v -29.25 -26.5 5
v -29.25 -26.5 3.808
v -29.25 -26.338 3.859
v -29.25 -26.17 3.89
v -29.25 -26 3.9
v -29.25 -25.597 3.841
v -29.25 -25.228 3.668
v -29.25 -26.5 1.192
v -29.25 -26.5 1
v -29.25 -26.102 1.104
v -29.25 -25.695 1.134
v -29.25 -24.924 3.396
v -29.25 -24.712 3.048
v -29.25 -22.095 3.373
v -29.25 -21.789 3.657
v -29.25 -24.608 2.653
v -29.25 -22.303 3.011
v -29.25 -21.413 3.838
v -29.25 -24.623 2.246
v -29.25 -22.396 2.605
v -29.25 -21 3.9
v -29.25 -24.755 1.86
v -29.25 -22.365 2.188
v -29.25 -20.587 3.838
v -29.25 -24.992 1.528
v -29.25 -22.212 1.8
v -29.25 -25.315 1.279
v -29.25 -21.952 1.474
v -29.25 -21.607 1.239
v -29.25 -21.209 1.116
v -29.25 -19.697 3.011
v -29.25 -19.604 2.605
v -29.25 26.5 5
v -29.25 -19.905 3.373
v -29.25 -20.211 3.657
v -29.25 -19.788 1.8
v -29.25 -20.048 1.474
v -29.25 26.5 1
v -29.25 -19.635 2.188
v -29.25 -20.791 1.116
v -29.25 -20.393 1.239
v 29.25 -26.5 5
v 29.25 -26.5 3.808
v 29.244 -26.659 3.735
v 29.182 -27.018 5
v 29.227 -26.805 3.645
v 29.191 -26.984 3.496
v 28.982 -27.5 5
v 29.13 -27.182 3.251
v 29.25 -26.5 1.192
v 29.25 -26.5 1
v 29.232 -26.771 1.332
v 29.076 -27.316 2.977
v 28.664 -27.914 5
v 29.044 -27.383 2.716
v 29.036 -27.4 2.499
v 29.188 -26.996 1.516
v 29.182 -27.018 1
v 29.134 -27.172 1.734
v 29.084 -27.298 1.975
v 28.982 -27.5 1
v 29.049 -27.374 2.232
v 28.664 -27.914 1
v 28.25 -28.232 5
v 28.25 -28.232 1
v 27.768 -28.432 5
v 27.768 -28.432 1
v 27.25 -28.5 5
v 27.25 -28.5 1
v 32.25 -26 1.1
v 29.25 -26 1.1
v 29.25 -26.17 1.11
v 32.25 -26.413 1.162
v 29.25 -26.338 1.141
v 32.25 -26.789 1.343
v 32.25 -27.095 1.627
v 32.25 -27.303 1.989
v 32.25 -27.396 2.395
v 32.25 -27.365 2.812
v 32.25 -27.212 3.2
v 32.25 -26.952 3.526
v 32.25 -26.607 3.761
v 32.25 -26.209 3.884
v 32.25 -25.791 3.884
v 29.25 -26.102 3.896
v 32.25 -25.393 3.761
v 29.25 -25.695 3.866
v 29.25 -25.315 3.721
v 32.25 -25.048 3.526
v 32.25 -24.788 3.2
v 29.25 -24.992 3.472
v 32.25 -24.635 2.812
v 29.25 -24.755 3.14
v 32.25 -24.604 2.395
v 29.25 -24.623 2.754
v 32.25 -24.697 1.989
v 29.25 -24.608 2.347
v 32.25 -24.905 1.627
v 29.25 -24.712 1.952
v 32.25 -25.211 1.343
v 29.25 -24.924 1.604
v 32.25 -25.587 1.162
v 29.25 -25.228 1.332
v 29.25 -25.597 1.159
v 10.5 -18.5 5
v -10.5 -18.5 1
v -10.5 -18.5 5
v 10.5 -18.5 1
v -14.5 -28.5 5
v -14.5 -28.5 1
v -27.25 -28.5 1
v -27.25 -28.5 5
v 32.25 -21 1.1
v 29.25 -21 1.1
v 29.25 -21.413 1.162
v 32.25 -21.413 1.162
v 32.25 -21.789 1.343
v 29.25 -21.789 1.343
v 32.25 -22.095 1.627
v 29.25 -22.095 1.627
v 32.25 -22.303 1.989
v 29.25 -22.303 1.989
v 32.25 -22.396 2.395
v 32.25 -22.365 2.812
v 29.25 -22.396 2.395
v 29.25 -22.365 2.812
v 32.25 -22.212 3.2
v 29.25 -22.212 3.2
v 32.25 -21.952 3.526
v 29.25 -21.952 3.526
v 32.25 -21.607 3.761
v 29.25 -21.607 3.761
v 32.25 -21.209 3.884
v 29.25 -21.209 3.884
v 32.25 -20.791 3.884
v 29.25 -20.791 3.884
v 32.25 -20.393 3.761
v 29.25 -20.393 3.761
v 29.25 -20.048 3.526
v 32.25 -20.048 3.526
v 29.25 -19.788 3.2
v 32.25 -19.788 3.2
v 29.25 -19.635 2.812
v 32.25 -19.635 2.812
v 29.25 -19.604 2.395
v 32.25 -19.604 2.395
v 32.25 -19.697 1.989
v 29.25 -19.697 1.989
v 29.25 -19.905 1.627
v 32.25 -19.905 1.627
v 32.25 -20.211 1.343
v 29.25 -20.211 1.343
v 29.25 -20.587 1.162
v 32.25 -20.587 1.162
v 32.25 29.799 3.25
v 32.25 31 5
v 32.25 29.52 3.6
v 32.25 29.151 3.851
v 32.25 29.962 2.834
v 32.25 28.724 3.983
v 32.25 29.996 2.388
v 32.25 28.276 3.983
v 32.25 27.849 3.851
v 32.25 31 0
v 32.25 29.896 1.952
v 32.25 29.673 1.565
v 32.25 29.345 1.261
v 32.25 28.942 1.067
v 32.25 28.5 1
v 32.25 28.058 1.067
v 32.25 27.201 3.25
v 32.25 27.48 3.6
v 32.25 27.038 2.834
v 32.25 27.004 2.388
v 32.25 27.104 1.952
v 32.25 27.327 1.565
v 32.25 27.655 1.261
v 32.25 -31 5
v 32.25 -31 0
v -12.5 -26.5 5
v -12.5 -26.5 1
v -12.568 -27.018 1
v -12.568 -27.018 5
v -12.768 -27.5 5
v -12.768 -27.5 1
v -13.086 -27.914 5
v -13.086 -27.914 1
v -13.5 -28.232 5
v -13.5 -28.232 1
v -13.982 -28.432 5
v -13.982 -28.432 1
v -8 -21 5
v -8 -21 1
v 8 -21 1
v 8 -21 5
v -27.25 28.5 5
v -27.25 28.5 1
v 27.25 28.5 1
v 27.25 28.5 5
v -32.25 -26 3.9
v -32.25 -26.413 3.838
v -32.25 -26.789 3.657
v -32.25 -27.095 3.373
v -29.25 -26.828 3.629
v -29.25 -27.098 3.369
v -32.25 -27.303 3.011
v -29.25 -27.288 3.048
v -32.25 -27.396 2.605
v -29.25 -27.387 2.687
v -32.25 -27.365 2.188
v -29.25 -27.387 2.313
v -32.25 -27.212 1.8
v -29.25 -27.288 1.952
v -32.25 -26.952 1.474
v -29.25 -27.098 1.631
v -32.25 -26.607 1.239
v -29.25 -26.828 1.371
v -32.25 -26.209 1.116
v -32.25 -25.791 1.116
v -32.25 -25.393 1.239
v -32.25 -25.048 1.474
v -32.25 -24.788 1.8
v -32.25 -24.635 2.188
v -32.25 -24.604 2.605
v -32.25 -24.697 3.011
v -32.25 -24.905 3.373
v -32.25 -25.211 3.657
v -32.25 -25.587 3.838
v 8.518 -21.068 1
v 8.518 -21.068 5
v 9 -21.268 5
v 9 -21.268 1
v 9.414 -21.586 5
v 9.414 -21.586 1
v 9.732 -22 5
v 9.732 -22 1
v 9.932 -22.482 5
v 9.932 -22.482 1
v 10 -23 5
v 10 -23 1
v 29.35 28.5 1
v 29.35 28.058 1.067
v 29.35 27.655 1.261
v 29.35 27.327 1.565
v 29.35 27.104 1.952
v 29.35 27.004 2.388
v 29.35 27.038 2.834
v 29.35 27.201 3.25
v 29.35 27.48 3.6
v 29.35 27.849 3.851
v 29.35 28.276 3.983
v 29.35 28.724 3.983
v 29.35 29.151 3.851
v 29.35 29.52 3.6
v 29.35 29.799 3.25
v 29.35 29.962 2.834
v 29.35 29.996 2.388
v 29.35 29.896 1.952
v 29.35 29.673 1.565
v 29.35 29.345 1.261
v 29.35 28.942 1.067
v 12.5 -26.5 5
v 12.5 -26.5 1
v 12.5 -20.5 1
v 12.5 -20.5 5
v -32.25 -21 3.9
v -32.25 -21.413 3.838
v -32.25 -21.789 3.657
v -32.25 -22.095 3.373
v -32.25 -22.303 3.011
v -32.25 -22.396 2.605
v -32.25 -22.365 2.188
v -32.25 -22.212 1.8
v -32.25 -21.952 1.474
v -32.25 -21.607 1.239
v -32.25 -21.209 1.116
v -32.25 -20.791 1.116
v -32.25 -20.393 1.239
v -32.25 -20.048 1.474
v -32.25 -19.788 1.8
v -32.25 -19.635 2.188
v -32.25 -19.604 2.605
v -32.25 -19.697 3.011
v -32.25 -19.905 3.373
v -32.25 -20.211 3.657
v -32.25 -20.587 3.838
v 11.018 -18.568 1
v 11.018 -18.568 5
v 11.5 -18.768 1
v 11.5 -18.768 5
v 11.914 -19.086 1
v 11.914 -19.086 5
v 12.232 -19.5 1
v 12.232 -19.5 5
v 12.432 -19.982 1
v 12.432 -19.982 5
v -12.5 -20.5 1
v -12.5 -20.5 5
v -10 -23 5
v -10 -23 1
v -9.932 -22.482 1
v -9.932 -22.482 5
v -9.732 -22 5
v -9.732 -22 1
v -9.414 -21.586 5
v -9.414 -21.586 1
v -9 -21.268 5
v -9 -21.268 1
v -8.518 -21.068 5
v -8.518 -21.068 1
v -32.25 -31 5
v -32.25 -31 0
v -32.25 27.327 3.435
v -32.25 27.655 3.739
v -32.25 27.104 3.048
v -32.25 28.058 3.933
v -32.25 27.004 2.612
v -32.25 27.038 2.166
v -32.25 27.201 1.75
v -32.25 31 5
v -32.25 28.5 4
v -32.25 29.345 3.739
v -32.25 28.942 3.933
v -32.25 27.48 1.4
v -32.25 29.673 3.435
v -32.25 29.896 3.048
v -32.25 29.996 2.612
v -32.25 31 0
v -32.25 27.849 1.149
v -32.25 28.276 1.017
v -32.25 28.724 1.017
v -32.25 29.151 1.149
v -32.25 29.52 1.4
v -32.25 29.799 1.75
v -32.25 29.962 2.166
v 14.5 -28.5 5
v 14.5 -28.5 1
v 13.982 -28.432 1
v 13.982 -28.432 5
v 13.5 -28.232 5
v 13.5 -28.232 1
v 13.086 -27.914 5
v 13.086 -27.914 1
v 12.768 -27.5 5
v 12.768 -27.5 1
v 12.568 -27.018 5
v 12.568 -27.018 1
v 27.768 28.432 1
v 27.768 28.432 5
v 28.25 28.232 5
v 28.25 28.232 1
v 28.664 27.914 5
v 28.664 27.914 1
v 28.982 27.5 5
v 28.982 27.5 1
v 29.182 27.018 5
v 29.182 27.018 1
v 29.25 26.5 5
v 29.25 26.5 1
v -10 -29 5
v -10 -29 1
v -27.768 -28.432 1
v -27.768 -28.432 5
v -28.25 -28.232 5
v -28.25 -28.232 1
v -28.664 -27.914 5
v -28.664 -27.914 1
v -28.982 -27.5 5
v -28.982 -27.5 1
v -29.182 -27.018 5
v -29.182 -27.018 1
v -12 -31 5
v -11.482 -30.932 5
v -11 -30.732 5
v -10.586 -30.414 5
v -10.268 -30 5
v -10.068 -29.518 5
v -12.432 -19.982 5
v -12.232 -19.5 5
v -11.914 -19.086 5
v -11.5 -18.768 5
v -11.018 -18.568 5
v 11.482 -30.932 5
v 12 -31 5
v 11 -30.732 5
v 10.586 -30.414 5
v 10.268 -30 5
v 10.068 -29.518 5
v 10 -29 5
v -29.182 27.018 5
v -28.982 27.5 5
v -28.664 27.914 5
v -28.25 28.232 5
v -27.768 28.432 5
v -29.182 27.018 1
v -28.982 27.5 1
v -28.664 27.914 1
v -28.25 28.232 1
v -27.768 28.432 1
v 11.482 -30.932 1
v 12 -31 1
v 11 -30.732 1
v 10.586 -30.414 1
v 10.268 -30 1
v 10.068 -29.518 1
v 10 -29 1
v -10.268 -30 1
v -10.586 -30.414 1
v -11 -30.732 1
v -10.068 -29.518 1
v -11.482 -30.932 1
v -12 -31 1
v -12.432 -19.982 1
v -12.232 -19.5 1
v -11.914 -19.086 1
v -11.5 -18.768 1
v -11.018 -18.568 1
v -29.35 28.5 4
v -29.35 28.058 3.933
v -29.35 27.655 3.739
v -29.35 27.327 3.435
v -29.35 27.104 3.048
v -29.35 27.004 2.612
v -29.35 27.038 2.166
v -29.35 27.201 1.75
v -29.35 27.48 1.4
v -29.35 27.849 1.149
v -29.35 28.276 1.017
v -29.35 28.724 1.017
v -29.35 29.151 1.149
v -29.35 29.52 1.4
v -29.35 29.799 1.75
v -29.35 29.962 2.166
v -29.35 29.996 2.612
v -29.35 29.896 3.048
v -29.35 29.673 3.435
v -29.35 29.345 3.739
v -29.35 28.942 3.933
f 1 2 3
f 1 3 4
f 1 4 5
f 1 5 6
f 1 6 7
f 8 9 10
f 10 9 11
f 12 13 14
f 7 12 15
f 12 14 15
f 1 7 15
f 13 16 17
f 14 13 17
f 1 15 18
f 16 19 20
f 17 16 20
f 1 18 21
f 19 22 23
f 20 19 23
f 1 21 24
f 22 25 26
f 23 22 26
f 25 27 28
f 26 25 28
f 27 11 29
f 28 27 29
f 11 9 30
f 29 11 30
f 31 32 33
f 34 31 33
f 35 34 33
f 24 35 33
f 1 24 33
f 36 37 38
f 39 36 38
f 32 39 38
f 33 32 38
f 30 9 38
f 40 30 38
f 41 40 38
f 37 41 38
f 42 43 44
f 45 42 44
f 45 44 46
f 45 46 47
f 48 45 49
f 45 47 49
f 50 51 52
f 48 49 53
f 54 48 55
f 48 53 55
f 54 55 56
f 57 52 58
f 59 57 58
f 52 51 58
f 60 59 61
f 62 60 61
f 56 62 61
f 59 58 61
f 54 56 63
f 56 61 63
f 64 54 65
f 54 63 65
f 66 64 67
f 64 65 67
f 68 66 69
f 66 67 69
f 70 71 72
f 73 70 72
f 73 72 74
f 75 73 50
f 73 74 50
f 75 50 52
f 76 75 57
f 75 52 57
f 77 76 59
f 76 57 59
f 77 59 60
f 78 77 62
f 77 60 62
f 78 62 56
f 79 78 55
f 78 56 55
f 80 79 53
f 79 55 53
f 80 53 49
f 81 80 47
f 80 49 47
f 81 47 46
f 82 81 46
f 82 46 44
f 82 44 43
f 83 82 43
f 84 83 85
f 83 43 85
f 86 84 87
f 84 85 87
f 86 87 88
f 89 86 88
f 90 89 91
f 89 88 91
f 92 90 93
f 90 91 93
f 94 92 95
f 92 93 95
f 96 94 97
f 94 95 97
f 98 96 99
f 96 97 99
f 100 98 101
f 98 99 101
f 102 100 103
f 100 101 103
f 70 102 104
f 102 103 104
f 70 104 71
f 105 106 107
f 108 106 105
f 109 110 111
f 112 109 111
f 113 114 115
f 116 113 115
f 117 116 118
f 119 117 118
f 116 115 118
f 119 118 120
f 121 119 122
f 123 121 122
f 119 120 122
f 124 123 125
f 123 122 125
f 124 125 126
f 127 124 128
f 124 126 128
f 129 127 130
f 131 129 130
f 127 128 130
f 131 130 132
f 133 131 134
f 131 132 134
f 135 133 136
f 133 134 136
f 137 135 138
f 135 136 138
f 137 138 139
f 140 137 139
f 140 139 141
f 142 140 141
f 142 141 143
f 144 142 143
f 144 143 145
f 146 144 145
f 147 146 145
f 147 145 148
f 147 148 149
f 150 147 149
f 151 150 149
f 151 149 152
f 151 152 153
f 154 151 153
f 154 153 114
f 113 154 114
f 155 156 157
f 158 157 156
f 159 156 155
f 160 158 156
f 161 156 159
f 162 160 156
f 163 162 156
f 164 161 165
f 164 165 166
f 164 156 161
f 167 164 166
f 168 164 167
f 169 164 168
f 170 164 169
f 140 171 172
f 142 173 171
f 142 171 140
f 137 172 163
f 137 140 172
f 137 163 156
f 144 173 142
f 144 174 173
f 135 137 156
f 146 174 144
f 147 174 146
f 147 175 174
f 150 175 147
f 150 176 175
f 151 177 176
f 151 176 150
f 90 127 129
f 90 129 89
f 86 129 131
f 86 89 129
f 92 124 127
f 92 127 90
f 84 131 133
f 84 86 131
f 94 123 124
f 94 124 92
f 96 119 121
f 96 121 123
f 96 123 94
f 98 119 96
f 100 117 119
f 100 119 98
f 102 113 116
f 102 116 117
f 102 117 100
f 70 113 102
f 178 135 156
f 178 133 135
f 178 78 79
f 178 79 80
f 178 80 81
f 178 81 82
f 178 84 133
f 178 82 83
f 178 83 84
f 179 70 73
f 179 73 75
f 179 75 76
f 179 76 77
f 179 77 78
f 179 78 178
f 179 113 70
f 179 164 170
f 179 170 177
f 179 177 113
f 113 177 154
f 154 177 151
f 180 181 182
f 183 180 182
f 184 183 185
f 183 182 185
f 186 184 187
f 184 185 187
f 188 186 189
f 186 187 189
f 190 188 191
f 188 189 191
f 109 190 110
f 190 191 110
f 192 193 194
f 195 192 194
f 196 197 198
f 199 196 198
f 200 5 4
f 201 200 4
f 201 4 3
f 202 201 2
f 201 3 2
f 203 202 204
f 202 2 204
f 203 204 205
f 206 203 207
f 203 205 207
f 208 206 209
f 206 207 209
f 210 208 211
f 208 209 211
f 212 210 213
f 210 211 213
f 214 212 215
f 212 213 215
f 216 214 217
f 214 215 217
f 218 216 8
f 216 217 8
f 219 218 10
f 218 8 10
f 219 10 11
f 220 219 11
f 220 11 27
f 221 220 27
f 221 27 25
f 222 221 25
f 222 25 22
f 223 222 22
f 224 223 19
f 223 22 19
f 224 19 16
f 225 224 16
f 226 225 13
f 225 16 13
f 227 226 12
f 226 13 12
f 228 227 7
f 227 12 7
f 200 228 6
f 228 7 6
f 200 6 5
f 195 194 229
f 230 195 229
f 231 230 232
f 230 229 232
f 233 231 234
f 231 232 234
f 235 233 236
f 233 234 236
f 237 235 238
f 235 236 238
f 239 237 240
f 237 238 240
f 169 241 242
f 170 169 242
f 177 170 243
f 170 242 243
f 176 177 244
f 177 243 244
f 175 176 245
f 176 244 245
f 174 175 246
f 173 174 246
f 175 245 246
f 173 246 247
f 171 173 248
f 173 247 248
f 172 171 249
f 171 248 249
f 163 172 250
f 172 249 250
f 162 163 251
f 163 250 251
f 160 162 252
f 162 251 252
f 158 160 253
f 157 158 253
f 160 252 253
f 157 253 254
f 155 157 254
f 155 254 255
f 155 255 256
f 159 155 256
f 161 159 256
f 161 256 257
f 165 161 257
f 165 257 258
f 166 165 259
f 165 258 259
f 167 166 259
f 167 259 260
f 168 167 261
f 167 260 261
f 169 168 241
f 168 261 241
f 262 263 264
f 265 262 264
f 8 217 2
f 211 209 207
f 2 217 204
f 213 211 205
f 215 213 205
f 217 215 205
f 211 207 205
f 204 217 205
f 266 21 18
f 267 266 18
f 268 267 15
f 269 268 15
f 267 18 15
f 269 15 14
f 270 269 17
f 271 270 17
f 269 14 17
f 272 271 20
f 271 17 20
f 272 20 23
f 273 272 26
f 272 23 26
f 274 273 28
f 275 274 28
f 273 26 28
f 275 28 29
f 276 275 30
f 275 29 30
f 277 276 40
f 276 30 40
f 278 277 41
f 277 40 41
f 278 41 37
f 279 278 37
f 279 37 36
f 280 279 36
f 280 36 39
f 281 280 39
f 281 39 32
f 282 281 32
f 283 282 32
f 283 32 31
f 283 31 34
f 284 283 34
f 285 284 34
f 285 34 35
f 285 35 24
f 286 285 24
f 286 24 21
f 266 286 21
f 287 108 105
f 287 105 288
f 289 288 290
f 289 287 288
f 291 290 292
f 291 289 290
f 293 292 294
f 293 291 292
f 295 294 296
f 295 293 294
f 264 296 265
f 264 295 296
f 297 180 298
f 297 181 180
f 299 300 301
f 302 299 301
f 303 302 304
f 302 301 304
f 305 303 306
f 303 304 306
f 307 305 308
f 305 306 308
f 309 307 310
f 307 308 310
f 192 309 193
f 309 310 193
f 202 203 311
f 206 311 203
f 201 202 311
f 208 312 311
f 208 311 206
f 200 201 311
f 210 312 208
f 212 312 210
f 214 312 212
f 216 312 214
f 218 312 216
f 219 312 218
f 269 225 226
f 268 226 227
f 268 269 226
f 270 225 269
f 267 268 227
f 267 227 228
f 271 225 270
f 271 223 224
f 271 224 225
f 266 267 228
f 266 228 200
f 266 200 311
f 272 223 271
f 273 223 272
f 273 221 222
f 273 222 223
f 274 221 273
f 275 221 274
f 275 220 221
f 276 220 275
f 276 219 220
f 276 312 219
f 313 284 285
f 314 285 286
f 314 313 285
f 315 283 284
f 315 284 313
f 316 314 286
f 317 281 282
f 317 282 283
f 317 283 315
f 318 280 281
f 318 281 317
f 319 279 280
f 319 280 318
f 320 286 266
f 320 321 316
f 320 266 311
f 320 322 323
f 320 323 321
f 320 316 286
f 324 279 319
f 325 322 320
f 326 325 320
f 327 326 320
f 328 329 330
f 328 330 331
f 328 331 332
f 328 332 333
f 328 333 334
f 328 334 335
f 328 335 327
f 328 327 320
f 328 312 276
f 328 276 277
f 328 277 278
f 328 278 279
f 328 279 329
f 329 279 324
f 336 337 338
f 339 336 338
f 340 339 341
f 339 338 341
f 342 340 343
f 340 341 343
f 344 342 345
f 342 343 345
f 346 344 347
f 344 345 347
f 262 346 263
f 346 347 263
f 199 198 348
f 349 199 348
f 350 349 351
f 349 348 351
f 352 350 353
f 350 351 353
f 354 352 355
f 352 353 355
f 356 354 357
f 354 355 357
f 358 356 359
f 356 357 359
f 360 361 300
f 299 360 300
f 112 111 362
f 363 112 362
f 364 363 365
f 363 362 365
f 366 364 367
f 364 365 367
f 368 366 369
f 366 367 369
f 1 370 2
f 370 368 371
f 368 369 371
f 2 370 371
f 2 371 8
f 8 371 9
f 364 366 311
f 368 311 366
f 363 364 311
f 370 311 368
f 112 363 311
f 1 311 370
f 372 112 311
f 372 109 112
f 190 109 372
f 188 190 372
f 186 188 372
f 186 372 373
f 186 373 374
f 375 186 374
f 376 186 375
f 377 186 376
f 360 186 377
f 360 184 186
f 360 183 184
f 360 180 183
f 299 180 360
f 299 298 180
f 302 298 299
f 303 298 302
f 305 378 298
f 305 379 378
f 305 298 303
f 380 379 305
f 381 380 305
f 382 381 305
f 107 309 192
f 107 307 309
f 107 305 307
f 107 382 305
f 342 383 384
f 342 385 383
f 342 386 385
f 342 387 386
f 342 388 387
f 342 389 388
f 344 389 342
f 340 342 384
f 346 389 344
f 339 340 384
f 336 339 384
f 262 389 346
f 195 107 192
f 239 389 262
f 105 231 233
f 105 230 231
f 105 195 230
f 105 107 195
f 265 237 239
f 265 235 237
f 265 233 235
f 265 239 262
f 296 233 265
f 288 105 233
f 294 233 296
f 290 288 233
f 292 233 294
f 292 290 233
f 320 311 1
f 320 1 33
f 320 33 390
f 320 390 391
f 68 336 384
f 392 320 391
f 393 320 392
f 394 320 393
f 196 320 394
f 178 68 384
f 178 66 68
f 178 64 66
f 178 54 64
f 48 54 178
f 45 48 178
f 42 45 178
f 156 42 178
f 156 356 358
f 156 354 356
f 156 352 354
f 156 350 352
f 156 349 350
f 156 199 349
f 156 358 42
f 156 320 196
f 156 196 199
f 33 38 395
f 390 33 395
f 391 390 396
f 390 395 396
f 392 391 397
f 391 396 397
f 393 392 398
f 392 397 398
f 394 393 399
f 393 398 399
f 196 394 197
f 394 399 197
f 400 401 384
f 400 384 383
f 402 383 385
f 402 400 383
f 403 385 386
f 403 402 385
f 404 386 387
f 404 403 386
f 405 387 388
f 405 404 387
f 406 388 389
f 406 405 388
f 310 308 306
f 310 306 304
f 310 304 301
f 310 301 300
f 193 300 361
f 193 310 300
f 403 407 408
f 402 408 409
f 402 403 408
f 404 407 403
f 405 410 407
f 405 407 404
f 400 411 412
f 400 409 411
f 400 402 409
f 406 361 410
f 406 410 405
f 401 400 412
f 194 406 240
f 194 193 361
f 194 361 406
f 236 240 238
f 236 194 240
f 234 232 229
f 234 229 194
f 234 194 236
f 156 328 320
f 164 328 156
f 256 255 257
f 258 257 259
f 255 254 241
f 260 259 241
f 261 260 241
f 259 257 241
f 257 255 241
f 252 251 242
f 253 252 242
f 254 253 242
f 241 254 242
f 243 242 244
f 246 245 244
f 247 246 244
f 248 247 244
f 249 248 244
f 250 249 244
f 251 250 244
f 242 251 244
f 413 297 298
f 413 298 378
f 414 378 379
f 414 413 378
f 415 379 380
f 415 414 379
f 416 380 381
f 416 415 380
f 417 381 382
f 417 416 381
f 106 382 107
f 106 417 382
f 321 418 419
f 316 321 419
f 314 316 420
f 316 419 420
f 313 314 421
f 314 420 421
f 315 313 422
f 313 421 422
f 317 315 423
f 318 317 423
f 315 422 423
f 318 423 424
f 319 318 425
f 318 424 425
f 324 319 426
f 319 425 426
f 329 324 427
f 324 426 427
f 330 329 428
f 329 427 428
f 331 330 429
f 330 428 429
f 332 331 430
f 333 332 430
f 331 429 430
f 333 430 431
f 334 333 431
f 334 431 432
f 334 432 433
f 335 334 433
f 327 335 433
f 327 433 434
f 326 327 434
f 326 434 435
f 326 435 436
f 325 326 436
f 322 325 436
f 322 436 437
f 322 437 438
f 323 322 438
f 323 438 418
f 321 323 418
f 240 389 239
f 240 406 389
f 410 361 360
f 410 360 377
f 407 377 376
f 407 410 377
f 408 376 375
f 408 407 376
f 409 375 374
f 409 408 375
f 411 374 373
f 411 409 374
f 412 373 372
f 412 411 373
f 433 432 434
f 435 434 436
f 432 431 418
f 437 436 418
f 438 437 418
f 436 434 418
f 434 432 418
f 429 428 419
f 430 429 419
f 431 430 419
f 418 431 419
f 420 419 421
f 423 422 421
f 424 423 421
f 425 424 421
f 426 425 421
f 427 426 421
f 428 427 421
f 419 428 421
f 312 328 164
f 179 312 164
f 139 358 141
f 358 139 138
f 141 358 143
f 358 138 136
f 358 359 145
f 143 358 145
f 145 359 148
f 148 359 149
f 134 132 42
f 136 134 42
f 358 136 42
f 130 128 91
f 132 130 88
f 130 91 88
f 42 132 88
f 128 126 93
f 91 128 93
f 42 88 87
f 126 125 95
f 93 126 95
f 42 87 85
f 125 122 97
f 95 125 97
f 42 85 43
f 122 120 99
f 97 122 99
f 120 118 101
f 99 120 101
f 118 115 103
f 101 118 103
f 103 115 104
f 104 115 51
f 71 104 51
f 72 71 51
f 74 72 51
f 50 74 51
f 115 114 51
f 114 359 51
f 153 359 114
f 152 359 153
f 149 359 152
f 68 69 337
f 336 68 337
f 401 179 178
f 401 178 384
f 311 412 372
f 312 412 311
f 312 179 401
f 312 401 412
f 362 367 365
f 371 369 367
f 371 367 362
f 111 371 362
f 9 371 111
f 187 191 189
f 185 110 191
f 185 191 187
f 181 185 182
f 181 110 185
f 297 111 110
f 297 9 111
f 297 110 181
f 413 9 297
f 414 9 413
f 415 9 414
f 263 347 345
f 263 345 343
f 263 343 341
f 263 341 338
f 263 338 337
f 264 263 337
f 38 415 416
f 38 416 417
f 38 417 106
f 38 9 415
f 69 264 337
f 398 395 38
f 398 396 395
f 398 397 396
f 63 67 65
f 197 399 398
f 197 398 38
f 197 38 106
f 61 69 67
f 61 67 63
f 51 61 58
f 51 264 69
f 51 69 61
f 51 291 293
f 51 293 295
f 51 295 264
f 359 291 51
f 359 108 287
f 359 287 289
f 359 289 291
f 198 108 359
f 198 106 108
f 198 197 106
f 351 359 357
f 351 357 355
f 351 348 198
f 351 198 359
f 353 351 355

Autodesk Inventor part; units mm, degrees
ref_plane "YZ Plane" through (0, 0, 0) normal (1, 0, 0) x (0, 1, 0)
ref_plane "XZ Plane" through (0, 0, 0) normal (0, 1, 0) x (-1, 0, 0)
ref_plane "XY Plane" through (0, 0, 0) normal (0, 0, 1) x (1, 0, 0)
sketch "スケッチ1" plane through (0, 0, 0) normal (0, 0, 1) x (1, 0, 0)
  line L0 (-32.25, 31) -> (32.25, 31)
  line L1 (32.25, 31) -> (32.25, -31)
  line L2 (32.25, -31) -> (10, -31)
  line L3 (-32.25, -31) -> (-32.25, 31)
  line L4 (-32.25, 31) -> (32.25, -31) construction
  line L5 (32.25, 31) -> (-32.25, -31) construction
  line L6 (-29.25, 28.5) -> (29.25, 28.5)
  line L7 (29.25, 28.5) -> (29.25, -28.5)
  line L8 (29.25, -28.5) -> (12.5, -28.5)
  line L9 (-29.25, -28.5) -> (-29.25, 28.5)
  line L10 (-29.25, 28.5) -> (29.25, -28.5) construction
  line L11 (29.25, 28.5) -> (-29.25, -28.5) construction
  line L12 (0, 31) -> (0, -28.25) construction
  line L13 (-10, -31) -> (-10, -21)
  line L14 (-10, -21) -> (10, -21)
  line L15 (10, -31) -> (10, -21)
  line L16 (-12.5, -28.5) -> (-12.5, -18.5)
  line L17 (-12.5, -18.5) -> (12.5, -18.5)
  line L18 (12.5, -28.5) -> (12.5, -18.5)
  line L19 (-12.5, -28.5) -> (-29.25, -28.5)
  line L20 (-10, -31) -> (-32.25, -31)
  line L21 (-10, -31) -> (10, -31)
  point P0 (0, 0)
  point P1 (10, -25.75)
  point P2 (10, -28.25)
  point P3 (-10, -25.75)
  dimension "d0" = 64.5
  dimension "d1" = 62
  dimension "d2" = 3
  dimension "d3" = 2.5
  dimension "d40" = 20
  dimension "d41" = 10
  dimension "d42" = 2.5
  dimension "d43" = 2.5
extrude "押し出し1" add sketch "スケッチ1" along normal blind 5 contours L0 L1 L2 L15 L14 L13 L20 L3
extrude "押し出し2" add sketch "スケッチ1" along normal blind 1 contours L13 L14 L15 L21 | L6 L7 L8 L18 L17 L16 L19 L9
sketch "スケッチ2" plane through (32.25, -31, 0) normal (1, 0, 0) x (0, 0, -1)
  line L0 (0, 0) -> (-5, 0) projected
  line L1 (0, 62) -> (-5, 62) projected
  line L2 (-2.5, 62) -> (-2.5, 0) construction
  point P0 (0, 31)
  point P1 (-2.5, 59.5)
  point P2 (-2.5, 5)
  point P3 (-2.5, 10)
  dimension "d8" = 5
  dimension "d9" = 5
  dimension "d10" = 2.5
hole "穴1" at (32.25, 28.5, 2.5) direction (-1, 0, 0) diameter 3 depth 2.9
hole "穴2" at (32.25, -21, 2.5) at (32.25, -26, 2.5) direction (-1, 0, 0) diameter 2.8 depth 3
fillet "フィレット1" radius 2 12 edges at (-29.25, 28.5, 3) (29.25, -28.5, 3) (29.25, 28.5, 3) (-12.5, -28.5, 3) (-29.25, -28.5, 3) (12.5, -28.5, 3) (10, -21, 3) (-10, -21, 3) (-12.5, -18.5, 3) (12.5, -18.5, 3) (-10, -31, 3) (10, -31, 3)
sketch "スケッチ3" plane through (-32.25, -31, 0) normal (-1, 0, 0) x (0, 0, 1)
  circle A0 centre (2.5, 59.5) radius 1.5 projected
  arc A1 (3.8077, 4.5) -> (1.1923, 4.5) centre (2.5, 5) ccw projected
  circle A2 centre (2.5, 10) radius 1.4 projected
  point P0 (0, 31)
  point P1 (2.5, 5)
  point P2 (2.5, 10)
hole "穴3" at (-32.25, 28.5, 2.5) direction (1, 0, 0) diameter 3 depth 2.9
hole "穴4" at (-32.25, -26, 2.5) at (-32.25, -21, 2.5) direction (1, 0, 0) diameter 2.8 depth 3
equation "\"d43\" = d42"
properties part number "Cockpit_upper_back_door" material "アセタール樹脂、黒"
